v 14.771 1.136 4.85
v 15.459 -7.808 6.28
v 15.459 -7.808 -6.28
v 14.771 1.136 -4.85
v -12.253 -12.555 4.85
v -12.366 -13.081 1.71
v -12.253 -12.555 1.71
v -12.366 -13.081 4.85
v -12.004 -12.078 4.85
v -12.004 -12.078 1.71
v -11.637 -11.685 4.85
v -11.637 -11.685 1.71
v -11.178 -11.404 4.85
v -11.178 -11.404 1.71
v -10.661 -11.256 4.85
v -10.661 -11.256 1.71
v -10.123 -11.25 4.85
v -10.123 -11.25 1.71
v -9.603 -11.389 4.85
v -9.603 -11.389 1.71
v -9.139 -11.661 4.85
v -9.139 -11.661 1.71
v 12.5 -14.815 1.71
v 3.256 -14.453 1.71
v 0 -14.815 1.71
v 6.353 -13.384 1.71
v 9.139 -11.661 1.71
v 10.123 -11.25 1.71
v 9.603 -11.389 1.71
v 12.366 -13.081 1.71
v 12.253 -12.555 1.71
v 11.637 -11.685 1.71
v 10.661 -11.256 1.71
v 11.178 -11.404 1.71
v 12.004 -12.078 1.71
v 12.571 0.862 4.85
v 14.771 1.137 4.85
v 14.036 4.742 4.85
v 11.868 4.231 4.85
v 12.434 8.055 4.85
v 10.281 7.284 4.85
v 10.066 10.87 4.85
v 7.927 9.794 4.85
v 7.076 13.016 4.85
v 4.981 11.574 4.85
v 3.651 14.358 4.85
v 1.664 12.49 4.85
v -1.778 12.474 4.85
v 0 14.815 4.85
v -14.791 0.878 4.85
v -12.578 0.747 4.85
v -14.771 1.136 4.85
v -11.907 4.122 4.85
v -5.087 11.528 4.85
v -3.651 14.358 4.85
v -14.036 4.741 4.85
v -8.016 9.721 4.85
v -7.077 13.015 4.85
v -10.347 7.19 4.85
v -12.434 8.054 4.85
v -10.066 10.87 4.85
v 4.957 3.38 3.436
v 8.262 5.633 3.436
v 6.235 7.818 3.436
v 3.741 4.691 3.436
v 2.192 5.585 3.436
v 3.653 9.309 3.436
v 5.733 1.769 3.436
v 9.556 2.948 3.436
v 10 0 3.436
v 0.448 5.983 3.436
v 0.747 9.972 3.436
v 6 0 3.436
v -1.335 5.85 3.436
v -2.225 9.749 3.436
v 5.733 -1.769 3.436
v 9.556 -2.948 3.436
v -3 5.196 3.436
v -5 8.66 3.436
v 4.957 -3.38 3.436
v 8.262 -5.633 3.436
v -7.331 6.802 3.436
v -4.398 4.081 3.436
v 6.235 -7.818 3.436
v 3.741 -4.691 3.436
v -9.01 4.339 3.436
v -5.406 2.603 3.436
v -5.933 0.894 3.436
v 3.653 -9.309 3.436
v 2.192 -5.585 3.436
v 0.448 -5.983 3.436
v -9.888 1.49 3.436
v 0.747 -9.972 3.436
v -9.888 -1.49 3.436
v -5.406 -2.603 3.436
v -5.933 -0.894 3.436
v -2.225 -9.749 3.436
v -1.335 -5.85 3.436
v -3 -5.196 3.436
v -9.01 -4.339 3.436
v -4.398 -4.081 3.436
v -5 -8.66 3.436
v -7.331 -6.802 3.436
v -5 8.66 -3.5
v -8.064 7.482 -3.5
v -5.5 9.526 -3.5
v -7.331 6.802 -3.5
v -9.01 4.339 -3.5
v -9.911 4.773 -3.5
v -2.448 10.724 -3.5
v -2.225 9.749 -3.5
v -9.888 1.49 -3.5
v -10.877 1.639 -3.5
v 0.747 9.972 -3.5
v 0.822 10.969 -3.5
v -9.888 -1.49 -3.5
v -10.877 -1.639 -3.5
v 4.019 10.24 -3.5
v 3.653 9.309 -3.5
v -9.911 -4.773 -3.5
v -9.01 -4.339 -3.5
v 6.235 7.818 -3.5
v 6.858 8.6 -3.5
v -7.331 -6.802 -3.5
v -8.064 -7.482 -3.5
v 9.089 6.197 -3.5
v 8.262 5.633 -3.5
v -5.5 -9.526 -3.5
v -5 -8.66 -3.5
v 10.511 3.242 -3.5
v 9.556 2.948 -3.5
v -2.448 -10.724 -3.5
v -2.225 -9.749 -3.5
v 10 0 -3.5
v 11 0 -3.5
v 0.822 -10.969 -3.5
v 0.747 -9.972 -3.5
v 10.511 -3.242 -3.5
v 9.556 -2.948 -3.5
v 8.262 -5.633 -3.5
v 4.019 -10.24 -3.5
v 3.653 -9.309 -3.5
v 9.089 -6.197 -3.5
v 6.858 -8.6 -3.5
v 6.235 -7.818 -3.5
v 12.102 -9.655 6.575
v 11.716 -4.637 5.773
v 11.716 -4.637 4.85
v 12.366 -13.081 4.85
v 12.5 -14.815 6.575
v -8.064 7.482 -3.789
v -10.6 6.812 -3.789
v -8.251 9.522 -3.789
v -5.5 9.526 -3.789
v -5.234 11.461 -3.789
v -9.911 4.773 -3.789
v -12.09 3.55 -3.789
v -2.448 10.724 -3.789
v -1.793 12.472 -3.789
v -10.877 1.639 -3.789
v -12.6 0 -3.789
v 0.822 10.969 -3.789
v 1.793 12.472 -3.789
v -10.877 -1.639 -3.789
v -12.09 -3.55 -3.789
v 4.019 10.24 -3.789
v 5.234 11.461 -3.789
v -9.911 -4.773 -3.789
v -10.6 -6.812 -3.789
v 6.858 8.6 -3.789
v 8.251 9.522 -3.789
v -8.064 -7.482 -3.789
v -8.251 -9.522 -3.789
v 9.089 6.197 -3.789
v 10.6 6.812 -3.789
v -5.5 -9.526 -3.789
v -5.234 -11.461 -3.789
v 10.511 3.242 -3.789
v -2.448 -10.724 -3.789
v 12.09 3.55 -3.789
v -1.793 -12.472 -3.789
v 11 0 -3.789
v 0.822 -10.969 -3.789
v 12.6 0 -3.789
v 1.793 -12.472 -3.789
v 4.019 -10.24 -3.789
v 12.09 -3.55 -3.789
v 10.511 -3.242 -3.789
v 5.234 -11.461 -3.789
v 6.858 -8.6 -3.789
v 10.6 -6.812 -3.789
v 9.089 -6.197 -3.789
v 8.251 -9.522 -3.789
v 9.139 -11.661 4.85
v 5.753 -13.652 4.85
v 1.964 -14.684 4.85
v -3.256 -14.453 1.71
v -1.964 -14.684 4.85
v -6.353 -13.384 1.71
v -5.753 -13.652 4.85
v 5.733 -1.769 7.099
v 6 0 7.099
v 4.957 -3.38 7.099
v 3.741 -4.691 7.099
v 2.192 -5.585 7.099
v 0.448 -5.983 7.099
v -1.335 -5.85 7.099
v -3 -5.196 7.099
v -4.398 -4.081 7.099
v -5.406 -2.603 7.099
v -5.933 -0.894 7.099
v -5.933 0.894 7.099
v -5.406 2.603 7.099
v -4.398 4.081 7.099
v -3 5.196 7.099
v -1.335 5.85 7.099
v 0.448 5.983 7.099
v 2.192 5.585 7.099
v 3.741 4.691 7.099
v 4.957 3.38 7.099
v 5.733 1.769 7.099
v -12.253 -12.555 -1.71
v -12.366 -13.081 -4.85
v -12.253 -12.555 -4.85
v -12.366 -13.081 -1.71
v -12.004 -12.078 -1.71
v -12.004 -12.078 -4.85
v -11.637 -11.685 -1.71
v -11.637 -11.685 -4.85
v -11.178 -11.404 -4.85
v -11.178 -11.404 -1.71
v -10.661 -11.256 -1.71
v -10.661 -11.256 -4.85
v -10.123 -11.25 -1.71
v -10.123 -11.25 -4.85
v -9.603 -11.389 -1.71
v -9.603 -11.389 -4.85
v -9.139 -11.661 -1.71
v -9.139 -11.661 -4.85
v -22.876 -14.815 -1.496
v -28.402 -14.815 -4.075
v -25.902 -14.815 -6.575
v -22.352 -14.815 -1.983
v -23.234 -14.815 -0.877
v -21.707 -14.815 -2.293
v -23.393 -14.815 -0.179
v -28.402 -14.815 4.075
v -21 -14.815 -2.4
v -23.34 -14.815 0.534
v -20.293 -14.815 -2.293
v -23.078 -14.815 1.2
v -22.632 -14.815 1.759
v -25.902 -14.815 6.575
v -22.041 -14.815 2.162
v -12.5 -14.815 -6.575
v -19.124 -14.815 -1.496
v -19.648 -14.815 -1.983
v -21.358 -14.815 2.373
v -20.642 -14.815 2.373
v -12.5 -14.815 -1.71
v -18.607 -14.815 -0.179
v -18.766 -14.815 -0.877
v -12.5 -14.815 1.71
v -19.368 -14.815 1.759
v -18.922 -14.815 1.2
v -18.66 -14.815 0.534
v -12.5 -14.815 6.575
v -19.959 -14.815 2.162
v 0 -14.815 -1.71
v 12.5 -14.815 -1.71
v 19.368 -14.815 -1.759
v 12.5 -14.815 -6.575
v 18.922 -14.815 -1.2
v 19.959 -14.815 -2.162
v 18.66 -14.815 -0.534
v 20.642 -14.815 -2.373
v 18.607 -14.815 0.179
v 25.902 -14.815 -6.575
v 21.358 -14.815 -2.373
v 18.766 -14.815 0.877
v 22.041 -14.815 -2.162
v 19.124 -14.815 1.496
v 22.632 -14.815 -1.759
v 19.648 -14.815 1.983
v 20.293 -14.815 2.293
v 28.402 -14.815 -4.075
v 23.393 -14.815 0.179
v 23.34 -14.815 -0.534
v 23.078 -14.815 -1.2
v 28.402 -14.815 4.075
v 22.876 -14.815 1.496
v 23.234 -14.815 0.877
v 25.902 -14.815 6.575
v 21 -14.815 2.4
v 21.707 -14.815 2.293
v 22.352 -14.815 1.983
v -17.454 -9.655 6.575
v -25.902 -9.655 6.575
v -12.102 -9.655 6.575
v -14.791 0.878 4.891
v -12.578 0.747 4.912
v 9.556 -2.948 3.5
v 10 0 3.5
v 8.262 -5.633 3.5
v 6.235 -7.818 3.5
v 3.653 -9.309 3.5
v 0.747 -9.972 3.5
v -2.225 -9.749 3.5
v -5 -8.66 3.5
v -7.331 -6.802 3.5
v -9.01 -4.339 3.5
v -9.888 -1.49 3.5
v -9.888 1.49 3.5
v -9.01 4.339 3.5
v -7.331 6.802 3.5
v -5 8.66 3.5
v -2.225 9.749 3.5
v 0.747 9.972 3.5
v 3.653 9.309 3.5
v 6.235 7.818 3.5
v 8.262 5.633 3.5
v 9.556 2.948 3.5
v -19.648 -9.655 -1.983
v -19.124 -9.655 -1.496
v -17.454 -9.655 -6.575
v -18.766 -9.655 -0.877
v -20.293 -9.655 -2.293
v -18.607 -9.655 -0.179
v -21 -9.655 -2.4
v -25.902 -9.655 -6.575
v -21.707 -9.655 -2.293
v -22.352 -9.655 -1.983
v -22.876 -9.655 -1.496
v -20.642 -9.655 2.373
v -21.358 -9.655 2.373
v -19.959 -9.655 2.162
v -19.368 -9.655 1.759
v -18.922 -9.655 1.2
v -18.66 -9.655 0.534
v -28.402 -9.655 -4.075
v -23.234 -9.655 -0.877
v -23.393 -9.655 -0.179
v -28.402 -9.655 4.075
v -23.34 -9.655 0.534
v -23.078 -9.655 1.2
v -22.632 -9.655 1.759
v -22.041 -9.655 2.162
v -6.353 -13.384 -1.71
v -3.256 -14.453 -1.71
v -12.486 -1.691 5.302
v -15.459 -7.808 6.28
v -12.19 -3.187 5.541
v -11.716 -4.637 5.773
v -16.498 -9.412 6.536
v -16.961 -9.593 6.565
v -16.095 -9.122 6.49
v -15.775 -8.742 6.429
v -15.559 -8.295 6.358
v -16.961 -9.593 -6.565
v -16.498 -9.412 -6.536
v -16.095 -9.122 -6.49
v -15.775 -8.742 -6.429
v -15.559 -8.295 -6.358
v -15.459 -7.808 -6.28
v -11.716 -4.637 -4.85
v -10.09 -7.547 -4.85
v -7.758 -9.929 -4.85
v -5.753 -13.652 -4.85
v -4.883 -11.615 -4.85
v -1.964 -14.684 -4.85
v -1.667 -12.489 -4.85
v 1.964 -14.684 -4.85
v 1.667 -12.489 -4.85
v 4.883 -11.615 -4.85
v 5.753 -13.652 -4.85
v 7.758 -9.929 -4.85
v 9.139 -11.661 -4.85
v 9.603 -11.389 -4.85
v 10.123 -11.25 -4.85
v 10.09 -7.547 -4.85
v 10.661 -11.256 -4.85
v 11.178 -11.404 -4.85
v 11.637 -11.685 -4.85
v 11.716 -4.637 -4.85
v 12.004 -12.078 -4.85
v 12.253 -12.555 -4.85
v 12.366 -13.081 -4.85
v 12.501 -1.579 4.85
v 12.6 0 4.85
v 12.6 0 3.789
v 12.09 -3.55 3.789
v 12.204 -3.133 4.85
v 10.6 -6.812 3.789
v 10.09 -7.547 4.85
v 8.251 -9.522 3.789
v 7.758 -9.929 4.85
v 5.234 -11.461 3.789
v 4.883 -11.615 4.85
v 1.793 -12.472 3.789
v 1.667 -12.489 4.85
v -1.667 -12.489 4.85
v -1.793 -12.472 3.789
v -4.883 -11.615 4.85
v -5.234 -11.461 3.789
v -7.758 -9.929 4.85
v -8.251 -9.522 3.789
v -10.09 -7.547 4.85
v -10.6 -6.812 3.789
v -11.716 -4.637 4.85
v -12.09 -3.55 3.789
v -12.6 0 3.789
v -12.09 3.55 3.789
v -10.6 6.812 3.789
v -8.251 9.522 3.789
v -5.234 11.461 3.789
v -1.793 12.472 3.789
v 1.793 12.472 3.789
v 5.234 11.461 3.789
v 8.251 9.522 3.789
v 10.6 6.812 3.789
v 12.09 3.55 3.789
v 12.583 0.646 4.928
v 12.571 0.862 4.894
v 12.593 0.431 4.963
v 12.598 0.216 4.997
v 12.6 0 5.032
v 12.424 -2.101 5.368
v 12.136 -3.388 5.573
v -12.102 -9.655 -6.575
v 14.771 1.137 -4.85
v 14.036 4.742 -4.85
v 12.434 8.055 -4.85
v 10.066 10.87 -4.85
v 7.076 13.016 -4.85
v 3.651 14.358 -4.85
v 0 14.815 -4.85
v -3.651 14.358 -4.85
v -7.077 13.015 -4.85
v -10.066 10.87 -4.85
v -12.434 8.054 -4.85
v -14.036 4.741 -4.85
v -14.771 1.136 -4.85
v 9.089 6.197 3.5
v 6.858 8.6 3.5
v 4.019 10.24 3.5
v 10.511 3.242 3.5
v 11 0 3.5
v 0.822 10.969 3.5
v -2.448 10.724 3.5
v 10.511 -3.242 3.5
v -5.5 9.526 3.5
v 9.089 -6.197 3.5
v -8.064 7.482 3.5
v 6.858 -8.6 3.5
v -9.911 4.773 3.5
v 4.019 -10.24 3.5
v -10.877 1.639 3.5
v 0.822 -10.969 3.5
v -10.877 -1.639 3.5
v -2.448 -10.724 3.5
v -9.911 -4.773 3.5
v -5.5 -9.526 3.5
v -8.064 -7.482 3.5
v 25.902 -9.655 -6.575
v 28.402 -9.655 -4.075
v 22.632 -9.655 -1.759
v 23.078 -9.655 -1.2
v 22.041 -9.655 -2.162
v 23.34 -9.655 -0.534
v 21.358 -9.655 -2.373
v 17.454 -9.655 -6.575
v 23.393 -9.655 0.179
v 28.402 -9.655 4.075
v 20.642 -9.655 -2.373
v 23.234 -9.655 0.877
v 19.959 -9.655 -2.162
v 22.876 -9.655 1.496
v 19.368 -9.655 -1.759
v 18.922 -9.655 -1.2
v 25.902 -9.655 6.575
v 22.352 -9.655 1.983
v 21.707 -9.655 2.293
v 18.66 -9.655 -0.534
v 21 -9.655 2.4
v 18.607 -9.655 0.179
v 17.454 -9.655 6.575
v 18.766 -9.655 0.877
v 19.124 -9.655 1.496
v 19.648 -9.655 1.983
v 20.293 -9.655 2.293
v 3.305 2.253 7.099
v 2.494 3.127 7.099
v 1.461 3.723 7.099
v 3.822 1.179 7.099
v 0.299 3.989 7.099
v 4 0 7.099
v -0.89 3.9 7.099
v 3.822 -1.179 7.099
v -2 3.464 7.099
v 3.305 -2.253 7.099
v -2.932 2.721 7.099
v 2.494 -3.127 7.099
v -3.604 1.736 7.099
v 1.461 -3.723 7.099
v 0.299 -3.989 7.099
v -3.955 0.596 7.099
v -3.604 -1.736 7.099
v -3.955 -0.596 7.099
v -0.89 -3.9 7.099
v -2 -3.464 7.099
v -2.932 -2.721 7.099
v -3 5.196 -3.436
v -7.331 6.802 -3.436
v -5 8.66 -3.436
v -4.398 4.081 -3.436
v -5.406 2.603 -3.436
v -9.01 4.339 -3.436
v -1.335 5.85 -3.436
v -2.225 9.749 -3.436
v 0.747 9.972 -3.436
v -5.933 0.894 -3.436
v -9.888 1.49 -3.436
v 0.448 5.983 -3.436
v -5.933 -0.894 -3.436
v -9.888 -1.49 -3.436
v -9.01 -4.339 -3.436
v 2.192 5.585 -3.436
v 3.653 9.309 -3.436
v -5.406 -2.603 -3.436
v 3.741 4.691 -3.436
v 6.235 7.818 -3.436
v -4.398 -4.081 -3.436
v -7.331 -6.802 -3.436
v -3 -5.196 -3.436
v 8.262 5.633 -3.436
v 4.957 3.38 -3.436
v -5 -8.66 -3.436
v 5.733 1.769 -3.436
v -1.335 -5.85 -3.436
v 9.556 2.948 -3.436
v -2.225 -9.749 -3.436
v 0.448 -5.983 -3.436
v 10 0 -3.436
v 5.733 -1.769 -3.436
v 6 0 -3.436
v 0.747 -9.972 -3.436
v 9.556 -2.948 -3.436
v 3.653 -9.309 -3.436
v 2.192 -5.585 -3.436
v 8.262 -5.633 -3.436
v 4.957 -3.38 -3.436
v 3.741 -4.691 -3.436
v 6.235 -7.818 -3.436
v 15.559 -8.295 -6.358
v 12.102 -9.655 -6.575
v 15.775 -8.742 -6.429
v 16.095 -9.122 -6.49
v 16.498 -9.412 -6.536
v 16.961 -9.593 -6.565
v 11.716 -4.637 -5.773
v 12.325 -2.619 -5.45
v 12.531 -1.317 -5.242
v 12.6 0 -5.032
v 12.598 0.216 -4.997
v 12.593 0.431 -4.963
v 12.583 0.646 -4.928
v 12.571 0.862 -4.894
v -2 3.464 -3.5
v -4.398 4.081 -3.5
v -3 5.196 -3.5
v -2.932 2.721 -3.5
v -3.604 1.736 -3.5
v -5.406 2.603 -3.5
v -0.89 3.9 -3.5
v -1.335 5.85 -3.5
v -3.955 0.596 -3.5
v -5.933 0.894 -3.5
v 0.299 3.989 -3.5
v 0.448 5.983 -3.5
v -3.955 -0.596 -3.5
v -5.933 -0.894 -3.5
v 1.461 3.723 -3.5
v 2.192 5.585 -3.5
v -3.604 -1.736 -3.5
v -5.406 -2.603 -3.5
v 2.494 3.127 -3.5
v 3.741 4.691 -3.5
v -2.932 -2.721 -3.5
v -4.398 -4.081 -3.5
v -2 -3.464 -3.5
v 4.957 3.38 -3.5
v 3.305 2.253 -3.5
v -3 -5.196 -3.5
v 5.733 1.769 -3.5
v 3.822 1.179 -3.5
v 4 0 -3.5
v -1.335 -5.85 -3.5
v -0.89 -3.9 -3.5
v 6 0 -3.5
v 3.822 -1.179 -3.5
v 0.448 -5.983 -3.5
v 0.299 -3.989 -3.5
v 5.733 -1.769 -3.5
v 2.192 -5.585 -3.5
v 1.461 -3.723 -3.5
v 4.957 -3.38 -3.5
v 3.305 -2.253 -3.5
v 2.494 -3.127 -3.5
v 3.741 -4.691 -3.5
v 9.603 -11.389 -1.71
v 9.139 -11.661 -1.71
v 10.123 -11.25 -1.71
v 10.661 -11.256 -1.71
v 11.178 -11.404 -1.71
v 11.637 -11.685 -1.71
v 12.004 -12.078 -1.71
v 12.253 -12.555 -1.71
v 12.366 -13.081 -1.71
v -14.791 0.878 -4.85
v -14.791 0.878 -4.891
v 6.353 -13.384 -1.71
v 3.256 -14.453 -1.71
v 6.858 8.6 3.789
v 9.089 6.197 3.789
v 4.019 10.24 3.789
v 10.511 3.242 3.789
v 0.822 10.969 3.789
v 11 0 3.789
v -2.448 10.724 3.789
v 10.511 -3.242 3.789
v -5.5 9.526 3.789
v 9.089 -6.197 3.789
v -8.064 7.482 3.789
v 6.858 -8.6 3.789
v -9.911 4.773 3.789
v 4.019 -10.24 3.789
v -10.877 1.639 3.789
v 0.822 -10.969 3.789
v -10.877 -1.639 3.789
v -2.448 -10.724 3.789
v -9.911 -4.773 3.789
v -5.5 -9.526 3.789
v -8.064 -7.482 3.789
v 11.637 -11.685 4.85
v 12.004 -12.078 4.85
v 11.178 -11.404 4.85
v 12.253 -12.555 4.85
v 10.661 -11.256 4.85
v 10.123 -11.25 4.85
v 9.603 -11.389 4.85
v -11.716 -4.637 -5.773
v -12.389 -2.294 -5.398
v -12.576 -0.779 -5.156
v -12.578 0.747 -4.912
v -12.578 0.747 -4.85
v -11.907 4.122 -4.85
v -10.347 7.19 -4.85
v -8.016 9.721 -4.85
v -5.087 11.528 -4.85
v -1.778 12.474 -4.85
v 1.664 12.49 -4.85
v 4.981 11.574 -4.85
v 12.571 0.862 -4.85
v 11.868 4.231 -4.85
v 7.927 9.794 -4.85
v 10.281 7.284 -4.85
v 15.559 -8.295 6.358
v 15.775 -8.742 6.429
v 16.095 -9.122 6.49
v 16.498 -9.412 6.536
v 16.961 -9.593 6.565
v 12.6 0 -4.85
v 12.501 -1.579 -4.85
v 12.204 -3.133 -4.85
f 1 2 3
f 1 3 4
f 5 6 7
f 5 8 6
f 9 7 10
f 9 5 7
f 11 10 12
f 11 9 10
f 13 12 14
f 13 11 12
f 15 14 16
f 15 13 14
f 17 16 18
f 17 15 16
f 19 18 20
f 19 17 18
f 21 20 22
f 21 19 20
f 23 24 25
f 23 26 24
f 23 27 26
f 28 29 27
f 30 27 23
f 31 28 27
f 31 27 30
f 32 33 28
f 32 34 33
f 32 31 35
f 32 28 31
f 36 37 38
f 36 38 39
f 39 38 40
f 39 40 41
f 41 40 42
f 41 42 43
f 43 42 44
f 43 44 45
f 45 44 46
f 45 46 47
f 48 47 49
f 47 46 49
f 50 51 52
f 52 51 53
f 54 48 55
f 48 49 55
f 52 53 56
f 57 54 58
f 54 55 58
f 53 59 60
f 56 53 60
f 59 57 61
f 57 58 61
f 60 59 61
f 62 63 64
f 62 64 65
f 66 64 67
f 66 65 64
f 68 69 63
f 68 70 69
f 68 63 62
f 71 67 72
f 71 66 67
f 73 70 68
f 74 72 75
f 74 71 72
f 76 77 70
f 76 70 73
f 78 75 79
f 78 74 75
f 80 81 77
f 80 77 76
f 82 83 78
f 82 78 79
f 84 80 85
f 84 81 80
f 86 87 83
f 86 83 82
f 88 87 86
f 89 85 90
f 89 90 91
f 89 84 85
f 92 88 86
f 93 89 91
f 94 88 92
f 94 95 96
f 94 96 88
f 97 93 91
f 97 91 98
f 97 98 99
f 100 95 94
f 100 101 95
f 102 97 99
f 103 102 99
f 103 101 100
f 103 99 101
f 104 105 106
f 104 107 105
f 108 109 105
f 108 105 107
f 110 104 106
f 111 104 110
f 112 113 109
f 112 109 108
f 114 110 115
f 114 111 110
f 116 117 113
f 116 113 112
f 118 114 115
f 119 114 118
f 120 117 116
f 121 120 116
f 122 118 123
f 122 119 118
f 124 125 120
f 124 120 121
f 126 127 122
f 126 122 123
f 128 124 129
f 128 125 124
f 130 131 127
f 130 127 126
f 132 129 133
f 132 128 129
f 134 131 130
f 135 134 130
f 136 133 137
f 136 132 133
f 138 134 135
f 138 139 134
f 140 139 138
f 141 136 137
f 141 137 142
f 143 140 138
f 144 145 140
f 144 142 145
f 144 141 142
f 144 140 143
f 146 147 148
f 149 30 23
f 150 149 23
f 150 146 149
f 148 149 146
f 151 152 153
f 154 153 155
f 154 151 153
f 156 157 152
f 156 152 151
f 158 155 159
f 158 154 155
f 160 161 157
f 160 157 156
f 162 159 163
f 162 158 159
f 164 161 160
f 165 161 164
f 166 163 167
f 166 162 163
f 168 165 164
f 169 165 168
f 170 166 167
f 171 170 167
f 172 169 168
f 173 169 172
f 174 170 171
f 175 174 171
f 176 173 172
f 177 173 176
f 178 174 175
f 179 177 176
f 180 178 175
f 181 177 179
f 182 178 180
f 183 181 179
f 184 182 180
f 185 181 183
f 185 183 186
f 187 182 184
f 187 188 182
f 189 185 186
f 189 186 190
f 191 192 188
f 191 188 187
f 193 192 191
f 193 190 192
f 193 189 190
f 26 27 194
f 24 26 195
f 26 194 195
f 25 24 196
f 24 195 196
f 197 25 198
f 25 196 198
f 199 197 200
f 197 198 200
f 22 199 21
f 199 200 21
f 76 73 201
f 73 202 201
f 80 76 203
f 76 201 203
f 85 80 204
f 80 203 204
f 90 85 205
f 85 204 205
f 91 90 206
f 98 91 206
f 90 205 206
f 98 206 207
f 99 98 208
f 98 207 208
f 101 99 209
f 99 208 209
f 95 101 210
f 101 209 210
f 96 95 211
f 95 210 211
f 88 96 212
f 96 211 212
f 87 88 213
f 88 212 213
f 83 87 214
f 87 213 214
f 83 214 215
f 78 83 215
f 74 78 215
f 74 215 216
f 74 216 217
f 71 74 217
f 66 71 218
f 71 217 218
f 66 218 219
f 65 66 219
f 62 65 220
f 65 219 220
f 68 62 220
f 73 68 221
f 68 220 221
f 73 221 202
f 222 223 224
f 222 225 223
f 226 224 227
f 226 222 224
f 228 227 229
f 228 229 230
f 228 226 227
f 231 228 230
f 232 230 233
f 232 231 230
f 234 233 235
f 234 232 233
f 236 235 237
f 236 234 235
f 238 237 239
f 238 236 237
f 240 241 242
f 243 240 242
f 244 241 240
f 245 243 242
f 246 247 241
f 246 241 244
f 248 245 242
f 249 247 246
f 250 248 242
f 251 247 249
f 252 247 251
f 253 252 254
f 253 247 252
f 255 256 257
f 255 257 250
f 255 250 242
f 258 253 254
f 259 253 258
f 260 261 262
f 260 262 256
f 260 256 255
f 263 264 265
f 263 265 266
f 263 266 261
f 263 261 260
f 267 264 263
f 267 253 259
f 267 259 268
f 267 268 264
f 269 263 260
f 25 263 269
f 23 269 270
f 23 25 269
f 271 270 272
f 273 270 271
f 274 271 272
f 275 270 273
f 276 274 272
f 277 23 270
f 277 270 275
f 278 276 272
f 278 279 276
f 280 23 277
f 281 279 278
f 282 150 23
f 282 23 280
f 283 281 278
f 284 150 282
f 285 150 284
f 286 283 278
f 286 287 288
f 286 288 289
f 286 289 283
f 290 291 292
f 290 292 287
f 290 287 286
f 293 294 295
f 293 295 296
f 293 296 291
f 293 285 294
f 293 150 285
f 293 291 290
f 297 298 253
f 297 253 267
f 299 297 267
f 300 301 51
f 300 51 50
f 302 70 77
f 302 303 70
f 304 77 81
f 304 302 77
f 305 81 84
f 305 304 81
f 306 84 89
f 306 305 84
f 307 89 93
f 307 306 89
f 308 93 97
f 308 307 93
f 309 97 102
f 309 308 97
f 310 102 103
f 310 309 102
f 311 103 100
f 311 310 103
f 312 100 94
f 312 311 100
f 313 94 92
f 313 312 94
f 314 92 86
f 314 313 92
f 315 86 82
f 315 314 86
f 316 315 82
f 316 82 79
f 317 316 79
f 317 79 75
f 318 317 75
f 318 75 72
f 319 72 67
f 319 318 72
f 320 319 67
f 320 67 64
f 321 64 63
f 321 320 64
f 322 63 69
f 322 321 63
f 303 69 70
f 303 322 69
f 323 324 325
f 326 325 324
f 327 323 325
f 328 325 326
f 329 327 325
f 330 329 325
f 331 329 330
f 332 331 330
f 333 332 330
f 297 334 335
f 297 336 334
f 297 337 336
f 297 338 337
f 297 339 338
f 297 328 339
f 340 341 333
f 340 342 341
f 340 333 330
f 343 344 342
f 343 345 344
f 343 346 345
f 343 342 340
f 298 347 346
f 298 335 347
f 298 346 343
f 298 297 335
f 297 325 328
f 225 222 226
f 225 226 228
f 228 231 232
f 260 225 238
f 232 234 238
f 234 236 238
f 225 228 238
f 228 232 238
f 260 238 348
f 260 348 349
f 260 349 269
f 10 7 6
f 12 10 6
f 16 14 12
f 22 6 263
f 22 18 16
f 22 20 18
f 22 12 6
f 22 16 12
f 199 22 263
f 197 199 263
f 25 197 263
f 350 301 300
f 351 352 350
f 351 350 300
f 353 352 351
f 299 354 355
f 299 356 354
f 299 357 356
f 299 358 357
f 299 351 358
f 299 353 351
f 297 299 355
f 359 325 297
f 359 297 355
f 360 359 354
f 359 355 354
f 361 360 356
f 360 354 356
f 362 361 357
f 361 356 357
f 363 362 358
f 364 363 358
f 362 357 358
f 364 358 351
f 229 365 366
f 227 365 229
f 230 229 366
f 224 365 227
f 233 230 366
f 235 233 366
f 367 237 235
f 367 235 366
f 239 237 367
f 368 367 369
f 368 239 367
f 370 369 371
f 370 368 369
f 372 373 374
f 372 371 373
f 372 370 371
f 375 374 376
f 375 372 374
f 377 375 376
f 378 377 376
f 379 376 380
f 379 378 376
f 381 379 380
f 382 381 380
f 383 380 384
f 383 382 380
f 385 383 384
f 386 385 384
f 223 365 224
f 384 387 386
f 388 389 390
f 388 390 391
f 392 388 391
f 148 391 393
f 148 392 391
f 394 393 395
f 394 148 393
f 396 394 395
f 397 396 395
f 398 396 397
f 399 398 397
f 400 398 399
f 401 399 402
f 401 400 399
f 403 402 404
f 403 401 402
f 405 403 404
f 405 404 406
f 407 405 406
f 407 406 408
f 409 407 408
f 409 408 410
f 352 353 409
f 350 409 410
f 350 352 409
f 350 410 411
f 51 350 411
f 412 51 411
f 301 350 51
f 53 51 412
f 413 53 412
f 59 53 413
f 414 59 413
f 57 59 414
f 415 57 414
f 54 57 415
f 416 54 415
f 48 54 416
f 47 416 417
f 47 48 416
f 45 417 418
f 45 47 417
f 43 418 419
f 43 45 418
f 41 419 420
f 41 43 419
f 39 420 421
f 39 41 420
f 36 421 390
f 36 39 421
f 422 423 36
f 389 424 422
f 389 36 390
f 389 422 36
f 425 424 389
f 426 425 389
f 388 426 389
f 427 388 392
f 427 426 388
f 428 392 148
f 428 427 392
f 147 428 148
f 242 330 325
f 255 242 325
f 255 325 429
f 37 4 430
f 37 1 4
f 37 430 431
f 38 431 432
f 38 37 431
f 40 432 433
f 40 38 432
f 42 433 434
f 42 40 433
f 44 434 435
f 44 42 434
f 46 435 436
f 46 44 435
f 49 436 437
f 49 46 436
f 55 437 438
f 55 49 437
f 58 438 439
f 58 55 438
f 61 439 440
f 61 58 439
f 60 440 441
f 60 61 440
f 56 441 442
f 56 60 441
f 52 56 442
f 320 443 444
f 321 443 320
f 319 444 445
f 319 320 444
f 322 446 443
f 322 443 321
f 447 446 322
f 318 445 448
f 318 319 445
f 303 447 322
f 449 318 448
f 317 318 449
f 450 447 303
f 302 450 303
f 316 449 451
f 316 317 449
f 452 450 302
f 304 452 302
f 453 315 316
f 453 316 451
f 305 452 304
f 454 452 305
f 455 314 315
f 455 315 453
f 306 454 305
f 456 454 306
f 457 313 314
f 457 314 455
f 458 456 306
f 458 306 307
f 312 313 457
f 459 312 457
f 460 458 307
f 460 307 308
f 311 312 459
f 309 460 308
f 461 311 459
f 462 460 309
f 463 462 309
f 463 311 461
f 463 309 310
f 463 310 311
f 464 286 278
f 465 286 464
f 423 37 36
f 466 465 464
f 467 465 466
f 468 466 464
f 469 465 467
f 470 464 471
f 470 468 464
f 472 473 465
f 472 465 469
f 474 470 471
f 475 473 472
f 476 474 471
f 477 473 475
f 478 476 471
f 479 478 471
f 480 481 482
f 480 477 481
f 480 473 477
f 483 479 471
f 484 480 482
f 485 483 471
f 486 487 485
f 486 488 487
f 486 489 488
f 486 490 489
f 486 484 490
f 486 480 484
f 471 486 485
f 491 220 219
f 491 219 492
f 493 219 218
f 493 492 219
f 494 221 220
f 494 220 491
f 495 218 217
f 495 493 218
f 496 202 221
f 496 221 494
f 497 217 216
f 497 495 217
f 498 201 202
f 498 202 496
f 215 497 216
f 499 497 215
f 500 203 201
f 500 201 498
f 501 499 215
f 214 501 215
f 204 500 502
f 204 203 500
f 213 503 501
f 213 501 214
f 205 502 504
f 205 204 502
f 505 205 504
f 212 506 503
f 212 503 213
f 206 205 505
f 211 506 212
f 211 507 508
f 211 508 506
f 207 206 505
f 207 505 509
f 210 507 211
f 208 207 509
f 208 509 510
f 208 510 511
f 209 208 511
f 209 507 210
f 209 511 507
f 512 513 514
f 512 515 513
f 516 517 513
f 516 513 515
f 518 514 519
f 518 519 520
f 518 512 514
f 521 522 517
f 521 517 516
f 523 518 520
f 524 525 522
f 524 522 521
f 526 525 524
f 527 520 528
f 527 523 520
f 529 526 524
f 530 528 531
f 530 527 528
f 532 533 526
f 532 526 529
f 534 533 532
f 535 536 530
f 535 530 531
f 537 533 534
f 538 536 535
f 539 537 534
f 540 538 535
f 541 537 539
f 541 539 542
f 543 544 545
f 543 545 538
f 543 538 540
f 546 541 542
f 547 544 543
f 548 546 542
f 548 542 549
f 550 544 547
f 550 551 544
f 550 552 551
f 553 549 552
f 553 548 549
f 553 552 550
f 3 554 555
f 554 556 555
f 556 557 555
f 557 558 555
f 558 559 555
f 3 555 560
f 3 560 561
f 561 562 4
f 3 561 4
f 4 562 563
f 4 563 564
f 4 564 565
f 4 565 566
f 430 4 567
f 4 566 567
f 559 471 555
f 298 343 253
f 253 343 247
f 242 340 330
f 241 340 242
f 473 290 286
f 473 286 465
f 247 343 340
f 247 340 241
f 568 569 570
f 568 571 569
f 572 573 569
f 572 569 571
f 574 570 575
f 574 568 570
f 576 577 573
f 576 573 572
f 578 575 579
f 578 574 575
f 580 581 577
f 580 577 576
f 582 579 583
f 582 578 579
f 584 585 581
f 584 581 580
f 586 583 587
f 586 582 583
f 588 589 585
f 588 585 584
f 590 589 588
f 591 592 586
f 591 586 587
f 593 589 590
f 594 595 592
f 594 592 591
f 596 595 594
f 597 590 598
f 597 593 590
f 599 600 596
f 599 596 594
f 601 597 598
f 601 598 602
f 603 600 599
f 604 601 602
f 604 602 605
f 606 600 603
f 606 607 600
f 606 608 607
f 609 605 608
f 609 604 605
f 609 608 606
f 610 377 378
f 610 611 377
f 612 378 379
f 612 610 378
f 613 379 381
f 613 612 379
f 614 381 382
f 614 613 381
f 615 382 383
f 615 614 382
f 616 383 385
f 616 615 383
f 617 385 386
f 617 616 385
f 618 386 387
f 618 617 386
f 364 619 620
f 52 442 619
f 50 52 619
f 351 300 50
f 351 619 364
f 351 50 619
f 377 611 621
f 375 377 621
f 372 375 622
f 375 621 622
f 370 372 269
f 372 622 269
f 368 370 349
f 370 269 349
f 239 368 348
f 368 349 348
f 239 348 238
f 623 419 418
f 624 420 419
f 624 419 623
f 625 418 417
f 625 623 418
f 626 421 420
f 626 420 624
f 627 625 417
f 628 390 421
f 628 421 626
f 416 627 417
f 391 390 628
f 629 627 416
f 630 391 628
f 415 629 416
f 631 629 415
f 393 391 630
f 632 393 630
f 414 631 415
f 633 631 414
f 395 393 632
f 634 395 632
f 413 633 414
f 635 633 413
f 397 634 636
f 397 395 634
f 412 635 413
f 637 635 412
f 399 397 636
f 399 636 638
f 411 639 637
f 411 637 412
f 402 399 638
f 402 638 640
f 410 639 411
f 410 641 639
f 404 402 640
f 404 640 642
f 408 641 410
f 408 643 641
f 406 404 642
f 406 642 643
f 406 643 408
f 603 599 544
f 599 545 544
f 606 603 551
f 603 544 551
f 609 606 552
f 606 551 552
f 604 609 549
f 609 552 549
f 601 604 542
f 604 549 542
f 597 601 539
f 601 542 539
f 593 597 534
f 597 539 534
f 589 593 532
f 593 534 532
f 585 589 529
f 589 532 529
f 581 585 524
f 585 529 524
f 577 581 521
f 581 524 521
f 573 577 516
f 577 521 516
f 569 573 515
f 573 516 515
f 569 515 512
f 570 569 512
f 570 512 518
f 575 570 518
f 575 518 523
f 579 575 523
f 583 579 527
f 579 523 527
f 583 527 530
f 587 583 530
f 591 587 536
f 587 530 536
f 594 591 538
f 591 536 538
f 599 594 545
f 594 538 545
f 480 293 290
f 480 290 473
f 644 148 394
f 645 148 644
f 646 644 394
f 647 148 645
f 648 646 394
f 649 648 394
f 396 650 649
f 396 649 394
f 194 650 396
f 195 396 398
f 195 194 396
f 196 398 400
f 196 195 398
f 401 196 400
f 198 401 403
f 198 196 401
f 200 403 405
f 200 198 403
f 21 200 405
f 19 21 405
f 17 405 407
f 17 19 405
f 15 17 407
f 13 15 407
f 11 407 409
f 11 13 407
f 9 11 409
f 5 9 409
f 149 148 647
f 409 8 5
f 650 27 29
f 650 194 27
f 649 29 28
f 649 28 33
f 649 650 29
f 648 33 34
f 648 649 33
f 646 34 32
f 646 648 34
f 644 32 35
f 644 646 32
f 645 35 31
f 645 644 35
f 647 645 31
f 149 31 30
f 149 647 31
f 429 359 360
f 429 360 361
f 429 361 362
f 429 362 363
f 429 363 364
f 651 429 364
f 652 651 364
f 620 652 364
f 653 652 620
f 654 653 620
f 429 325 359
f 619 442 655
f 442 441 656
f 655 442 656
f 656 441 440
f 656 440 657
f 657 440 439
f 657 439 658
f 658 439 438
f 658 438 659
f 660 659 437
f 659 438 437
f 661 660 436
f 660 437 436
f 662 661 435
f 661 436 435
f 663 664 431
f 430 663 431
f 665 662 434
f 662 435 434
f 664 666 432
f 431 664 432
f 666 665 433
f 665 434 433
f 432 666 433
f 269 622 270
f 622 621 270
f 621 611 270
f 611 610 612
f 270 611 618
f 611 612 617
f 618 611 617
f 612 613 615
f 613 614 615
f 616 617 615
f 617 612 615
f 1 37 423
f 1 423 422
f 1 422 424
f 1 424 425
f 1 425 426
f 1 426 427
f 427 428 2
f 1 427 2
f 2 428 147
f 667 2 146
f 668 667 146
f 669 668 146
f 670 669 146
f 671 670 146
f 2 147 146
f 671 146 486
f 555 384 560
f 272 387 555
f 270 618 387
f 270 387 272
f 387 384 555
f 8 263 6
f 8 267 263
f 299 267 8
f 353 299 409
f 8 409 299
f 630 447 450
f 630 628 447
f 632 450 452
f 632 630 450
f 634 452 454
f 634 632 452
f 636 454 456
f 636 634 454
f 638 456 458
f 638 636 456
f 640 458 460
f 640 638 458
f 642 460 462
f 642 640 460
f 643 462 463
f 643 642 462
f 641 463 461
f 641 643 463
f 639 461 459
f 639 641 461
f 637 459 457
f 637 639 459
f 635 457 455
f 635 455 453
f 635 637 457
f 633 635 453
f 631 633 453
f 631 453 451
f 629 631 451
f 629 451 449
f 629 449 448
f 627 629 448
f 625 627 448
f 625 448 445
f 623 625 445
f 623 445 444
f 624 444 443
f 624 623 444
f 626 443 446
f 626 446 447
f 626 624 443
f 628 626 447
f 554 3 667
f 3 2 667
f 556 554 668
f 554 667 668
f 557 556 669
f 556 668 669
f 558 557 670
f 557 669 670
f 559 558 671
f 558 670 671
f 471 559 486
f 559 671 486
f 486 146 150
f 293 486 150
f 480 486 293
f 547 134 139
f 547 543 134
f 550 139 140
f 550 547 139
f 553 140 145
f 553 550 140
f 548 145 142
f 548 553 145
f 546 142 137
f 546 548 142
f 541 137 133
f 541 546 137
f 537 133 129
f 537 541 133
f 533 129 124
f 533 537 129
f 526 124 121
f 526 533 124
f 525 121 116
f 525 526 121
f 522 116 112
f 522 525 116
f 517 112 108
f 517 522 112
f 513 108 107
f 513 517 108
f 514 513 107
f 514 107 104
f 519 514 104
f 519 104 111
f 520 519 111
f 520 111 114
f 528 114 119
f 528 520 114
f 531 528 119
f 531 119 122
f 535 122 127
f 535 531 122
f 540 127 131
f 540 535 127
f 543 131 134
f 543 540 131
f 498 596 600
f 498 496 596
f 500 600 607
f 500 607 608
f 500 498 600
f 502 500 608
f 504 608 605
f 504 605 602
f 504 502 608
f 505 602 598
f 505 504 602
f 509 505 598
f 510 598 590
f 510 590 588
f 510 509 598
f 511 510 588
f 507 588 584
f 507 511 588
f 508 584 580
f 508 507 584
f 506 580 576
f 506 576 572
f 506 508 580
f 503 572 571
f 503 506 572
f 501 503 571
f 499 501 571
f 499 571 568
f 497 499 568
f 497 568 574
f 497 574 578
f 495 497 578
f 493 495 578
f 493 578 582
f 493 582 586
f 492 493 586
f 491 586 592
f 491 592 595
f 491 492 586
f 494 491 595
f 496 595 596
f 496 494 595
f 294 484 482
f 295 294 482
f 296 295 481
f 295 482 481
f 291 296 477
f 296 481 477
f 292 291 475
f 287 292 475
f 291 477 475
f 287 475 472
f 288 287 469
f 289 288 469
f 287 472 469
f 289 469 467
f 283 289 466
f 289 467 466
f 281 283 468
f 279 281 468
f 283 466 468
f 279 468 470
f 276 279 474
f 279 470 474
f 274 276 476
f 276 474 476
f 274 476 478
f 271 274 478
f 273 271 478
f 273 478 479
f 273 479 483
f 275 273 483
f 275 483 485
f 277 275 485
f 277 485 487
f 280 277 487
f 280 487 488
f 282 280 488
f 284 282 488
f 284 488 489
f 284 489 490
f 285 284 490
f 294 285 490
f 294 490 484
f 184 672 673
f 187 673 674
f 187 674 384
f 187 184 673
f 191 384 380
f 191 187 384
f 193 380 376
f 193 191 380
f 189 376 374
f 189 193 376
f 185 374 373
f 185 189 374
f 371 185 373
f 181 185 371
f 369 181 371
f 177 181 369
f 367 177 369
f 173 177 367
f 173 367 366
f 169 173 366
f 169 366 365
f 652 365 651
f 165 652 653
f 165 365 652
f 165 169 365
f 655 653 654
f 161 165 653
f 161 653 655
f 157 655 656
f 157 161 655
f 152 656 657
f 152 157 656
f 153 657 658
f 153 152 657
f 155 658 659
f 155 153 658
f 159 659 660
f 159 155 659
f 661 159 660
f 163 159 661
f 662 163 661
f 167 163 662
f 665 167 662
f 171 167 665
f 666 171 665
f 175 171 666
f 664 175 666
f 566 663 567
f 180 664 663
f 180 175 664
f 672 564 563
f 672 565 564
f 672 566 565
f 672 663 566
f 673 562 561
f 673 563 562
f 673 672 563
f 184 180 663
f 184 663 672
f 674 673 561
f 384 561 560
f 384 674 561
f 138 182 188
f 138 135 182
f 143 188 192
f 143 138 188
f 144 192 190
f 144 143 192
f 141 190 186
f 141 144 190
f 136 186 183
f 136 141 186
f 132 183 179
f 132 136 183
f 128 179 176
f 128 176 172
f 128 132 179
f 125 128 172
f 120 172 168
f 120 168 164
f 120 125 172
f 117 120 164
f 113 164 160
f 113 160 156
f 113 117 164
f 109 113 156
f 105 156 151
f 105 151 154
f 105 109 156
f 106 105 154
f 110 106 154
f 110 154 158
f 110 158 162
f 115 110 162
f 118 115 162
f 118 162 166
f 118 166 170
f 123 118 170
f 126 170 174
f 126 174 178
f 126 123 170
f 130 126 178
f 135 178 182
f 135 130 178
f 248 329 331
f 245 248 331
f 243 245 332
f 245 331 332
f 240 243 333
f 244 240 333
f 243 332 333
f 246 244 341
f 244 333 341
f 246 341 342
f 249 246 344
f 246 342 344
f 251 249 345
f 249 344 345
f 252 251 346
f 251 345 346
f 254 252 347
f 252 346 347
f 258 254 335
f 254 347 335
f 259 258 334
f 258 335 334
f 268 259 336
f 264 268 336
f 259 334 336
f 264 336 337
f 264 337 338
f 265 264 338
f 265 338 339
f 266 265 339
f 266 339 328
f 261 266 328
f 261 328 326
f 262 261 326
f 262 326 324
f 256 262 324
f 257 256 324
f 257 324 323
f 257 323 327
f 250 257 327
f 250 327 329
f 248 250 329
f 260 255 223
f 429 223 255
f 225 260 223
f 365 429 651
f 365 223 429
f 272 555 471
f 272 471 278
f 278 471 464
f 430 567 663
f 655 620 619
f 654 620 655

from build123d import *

# Parameters (mm, degrees)
BOSS_EXTRUDE1_DEPTH     = 6.575
SKETCH8_R               = 2.400000000000001
CUT_EXTRUDE3_DEPTH      = 39.155592587632775
CHAMFER1_SIZE           = 2.5
BOSS_EXTRUDE2_DEPTH     = 1.71
FILLET1_R               = 2
CUT_EXTRUDE4_DEPTH      = 1.725
CUT_EXTRUDE5_START      = -13.15
CUT_EXTRUDE5_DEPTH      = 1.725
CUT_EXTRUDE_THIN5_START = 7
CUT_EXTRUDE_THIN5_DEPTH = 26.81086056039093
CUT_EXTRUDE_THIN6_START = -7
CUT_EXTRUDE_THIN6_DEPTH = 26.81086056039093
FILLET2_R               = 2


# Read off the part's stored shape, not the designer's step: Cut-Extrude5
with BuildPart() as part:
    # Sketch1 → Revolve1 (revolve)
    with BuildSketch(Plane(origin=(0, 0, 0), x_dir=(0, 0, -1), z_dir=(1, 0, 0)), mode=Mode.PRIVATE) as revolve1_sk:
        Polygon((-7.0985121547008365, 5.999999999999999), (-3.4357973085956934, 6), (1.3e-15, 6), (3.4357973085956957, 6), (3.499999999999999, 6), (3.499999999999999, 4), (-7.0985121547008365, 3.999999999999999), align=None)
        Polygon((3.4357973085956957, 6), (1.3e-15, 6), (-3.4357973085956934, 6), (-3.4357973085956934, 9.999999999999998), (3.435797308595695, 9.999999999999998), align=None)
        Polygon((3.5000000000000013, 9.999999999999998), (3.435797308595695, 9.999999999999998), (-3.4357973085956934, 9.999999999999998), (-3.4999999999999996, 9.999999999999998), (-3.5000000000000018, 11), (-1.18e-15, 11), (3.499999999999999, 11), align=None)
        Polygon((3.789167362820558, 11), (3.499999999999999, 11), (-1.18e-15, 11), (-3.5000000000000018, 11), (-3.789167362820557, 11), (-3.789167362820557, 12.6), (5.8e-16, 12.6), (3.789167362820558, 12.6), align=None)
        Polygon((4.8500000000000005, 12.6), (3.789167362820558, 12.6), (5.8e-16, 12.6), (-3.789167362820557, 12.6), (-4.849999999999999, 12.6), (-4.849999999999999, 14.815), (0, 14.815), (4.8500000000000005, 14.815), align=None)
    revolve(revolve1_sk.sketch.rotate(Axis((0, 0, 11.627586075142245), (0, 0, -1)), 90), axis=Axis((0, 0, 11.627586075142245), (0, 0, -1)))

    # Sketch2 → Boss-Extrude1 (add, symmetric)
    with BuildSketch(Plane.XY):
        Polygon((28.402103283084184, -9.655000000000001), (15.601451795624948, -9.655000000000001), (12.102278163852397, -9.655000000000001), (12.500000000000004, -14.815000000000001), (28.402103283084184, -14.815), align=None)
        with BuildLine():
            ThreePointArc((14.771362958963898, 1.1362487995810626), (10.066049350023114, 10.87009086819882), (-3.5216e-13, 14.815000000000007))
            Line((0, 14.815000000000005), (0, 12.6))
            ThreePointArc((3.5261e-13, 12.600000000000001), (10.420944759538665, 7.082648538410167), (11.71553796349213, -4.6374745525959185))
            Line((11.71553796349213, -4.6374745525959185), (12.10227816385239, -9.655000000000001))
            Line((12.102278163852397, -9.655000000000001), (15.601451795624948, -9.655000000000001))
            Line((15.601451795624948, -9.655000000000001), (14.7713629589639, 1.1362487995810628))
        make_face()
        with BuildLine():
            Line((0, 12.6), (0, 14.815000000000005))
            ThreePointArc((-3.5216e-13, 14.815000000000007), (-10.066049350023373, 10.87009086819858), (-14.771362958963902, 1.136248799581064))
            Line((-14.7713629589639, 1.1362487995810628), (-15.601451795624941, -9.655000000000005))
            Line((-15.601451795624941, -9.655000000000005), (-12.10227816385239, -9.655000000000005))
            Line((-12.102278163852386, -9.655000000000005), (-11.71553796349213, -4.6374745525959185))
            ThreePointArc((-11.71553796349213, -4.637474552595917), (-10.420944759538465, 7.08264853841046), (3.5261e-13, 12.600000000000001))
        make_face()
        Polygon((-12.10227816385239, -9.655000000000005), (-15.601451795624941, -9.655000000000005), (-28.402103283084177, -9.655000000000006), (-28.402103283084177, -14.815000000000007), (-12.499999999999996, -14.815000000000005), align=None)
    extrude(amount=BOSS_EXTRUDE1_DEPTH, both=True)

    # Sketch8 → Cut-Extrude3 (cut, through all)
    with BuildSketch(Plane(origin=(0, -9.655000000000001, 0), x_dir=(1, 0, 0), z_dir=(0, 1, 0))):
        with Locations(Location((21.000000000000004, 0, 0), (0, 0, 270))):
            Circle(SKETCH8_R)
        with Locations(Location((-21.000000000000004, 0, 0), (0, 0, 90))):
            Circle(SKETCH8_R)
    extrude(amount=-CUT_EXTRUDE3_DEPTH, mode=Mode.SUBTRACT)

    # Chamfer1
    chamfer1_edges = [part.edges().sort_by_distance(p)[0] for p in [
        (-28.402103283084177, -12.235000000000007, -6.575),
        (28.402103283084184, -12.235, 6.575),
        (-28.402103283084177, -12.235000000000007, 6.575),
        (28.402103283084184, -12.235, -6.575),
    ]]
    chamfer(chamfer1_edges, length=CHAMFER1_SIZE)

    # Sketch9 → Boss-Extrude2 (add, symmetric)
    with BuildSketch(Plane.XY):
        with BuildLine():
            Line((-12.499999999999996, -14.815000000000007), (12.500000000000004, -14.815000000000001))
            Line((12.500000000000004, -14.815000000000001), (11.715537963492132, -4.637474552595919))
            ThreePointArc((11.715537963492132, -4.637474552595919), (-9.9e-16, -12.600000000000003), (-11.71553796349213, -4.6374745525959185))
            Line((-11.71553796349213, -4.6374745525959185), (-12.499999999999996, -14.815000000000007))
        make_face()
    extrude(amount=BOSS_EXTRUDE2_DEPTH, both=True)

    # Fillet1
    fillet1_edges = [part.edges().sort_by_distance(p)[0] for p in [
        (12.025078643317716, -8.653421786901651, -3.2800000000000002),
        (-12.025078643317713, -8.653421786901657, -3.2800000000000002),
        (-12.025078643317713, -8.653421786901657, 3.2799999999999994),
        (12.025078643317716, -8.653421786901651, 3.2799999999999994),
    ]]
    fillet(fillet1_edges, radius=FILLET1_R)

    # Sketch13 → Cut-Extrude4 (cut)
    with BuildSketch(Plane.XY.offset(6.575)):
        Polygon((-11.889993926761807, 0.705696375939659), (-17.610193659545324, 1.0452023711437894), (-14.425824047946865, 15.189187645015892), (3.1299229448728054, 17.38365601911835), (21.41715939572663, 11.678038246451958), (16.784392828177, 1.3884198701048673), (11.94080724759393, 0.7829716725319836), (0.5940928236877405, 11.678038246451958), align=None)
    extrude(amount=-CUT_EXTRUDE4_DEPTH, mode=Mode.SUBTRACT)

    # Cut-Extrude5 outline → Cut-Extrude5 (cut)
    with BuildSketch(Plane.XY.offset(6.575).offset(CUT_EXTRUDE5_START)):
        with BuildLine():
            Line((-14.791236442, 0.877891277), (-12.577865613, 0.746523021))
            ThreePointArc((-12.577865613, 0.746523021), (-0.057697816, 12.599867895), (12.57050125, 0.861683423))
            Line((12.57050125, 0.861683423), (14.771321629, 1.13678597))
            ThreePointArc((14.771321629, 1.13678597), (-0.000269379, 14.814999998), (-14.771362959, 1.1362488))
            Line((-14.771362959, 1.1362488), (-14.791236442, 0.877891277))
        make_face()
    extrude(amount=CUT_EXTRUDE5_DEPTH, mode=Mode.SUBTRACT)

    # Sketch14 → Cut-Extrude-Thin5 (cut, through all)
    with BuildSketch(Plane(origin=(0, 0, 0), x_dir=(0, 0, -1), z_dir=(1, 0, 0)).offset(CUT_EXTRUDE_THIN5_START)):
        Polygon((-4.849999999999999, 1.1367859701682461), (-6.575, -9.655000000000001), (-16.449646842920206, -8.076598996577228), (-14.724646842920205, 2.7151869735910195), align=None)
        Polygon((6.575, -9.655000000000001), (4.8500000000000005, 1.1367859701682461), (14.724646842920205, 2.7151869735910177), (16.449646842920206, -8.07659899657723), align=None)
    extrude(amount=CUT_EXTRUDE_THIN5_DEPTH, mode=Mode.SUBTRACT)

    # Sketch14<2> → Cut-Extrude-Thin6 (cut, through all)
    with BuildSketch(Plane(origin=(0, 0, 0), x_dir=(0, 0, -1), z_dir=(1, 0, 0)).offset(CUT_EXTRUDE_THIN6_START)):
        Polygon((-4.849999999999999, 1.1367859701682461), (-6.575, -9.655000000000001), (-16.449646842920206, -8.076598996577228), (-14.724646842920205, 2.7151869735910195), align=None)
        Polygon((6.575, -9.655000000000001), (4.8500000000000005, 1.1367859701682461), (14.724646842920205, 2.7151869735910177), (16.449646842920206, -8.07659899657723), align=None)
    extrude(amount=-CUT_EXTRUDE_THIN6_DEPTH, mode=Mode.SUBTRACT)

    # Fillet2
    fillet2_edges = [part.edges().sort_by_distance(p)[0] for p in [
        (15.601451795624948, -9.655000000000001, 0),
        (-15.601451795624941, -9.655000000000005, 0),
    ]]
    fillet(fillet2_edges, radius=FILLET2_R)


solid = part.part
